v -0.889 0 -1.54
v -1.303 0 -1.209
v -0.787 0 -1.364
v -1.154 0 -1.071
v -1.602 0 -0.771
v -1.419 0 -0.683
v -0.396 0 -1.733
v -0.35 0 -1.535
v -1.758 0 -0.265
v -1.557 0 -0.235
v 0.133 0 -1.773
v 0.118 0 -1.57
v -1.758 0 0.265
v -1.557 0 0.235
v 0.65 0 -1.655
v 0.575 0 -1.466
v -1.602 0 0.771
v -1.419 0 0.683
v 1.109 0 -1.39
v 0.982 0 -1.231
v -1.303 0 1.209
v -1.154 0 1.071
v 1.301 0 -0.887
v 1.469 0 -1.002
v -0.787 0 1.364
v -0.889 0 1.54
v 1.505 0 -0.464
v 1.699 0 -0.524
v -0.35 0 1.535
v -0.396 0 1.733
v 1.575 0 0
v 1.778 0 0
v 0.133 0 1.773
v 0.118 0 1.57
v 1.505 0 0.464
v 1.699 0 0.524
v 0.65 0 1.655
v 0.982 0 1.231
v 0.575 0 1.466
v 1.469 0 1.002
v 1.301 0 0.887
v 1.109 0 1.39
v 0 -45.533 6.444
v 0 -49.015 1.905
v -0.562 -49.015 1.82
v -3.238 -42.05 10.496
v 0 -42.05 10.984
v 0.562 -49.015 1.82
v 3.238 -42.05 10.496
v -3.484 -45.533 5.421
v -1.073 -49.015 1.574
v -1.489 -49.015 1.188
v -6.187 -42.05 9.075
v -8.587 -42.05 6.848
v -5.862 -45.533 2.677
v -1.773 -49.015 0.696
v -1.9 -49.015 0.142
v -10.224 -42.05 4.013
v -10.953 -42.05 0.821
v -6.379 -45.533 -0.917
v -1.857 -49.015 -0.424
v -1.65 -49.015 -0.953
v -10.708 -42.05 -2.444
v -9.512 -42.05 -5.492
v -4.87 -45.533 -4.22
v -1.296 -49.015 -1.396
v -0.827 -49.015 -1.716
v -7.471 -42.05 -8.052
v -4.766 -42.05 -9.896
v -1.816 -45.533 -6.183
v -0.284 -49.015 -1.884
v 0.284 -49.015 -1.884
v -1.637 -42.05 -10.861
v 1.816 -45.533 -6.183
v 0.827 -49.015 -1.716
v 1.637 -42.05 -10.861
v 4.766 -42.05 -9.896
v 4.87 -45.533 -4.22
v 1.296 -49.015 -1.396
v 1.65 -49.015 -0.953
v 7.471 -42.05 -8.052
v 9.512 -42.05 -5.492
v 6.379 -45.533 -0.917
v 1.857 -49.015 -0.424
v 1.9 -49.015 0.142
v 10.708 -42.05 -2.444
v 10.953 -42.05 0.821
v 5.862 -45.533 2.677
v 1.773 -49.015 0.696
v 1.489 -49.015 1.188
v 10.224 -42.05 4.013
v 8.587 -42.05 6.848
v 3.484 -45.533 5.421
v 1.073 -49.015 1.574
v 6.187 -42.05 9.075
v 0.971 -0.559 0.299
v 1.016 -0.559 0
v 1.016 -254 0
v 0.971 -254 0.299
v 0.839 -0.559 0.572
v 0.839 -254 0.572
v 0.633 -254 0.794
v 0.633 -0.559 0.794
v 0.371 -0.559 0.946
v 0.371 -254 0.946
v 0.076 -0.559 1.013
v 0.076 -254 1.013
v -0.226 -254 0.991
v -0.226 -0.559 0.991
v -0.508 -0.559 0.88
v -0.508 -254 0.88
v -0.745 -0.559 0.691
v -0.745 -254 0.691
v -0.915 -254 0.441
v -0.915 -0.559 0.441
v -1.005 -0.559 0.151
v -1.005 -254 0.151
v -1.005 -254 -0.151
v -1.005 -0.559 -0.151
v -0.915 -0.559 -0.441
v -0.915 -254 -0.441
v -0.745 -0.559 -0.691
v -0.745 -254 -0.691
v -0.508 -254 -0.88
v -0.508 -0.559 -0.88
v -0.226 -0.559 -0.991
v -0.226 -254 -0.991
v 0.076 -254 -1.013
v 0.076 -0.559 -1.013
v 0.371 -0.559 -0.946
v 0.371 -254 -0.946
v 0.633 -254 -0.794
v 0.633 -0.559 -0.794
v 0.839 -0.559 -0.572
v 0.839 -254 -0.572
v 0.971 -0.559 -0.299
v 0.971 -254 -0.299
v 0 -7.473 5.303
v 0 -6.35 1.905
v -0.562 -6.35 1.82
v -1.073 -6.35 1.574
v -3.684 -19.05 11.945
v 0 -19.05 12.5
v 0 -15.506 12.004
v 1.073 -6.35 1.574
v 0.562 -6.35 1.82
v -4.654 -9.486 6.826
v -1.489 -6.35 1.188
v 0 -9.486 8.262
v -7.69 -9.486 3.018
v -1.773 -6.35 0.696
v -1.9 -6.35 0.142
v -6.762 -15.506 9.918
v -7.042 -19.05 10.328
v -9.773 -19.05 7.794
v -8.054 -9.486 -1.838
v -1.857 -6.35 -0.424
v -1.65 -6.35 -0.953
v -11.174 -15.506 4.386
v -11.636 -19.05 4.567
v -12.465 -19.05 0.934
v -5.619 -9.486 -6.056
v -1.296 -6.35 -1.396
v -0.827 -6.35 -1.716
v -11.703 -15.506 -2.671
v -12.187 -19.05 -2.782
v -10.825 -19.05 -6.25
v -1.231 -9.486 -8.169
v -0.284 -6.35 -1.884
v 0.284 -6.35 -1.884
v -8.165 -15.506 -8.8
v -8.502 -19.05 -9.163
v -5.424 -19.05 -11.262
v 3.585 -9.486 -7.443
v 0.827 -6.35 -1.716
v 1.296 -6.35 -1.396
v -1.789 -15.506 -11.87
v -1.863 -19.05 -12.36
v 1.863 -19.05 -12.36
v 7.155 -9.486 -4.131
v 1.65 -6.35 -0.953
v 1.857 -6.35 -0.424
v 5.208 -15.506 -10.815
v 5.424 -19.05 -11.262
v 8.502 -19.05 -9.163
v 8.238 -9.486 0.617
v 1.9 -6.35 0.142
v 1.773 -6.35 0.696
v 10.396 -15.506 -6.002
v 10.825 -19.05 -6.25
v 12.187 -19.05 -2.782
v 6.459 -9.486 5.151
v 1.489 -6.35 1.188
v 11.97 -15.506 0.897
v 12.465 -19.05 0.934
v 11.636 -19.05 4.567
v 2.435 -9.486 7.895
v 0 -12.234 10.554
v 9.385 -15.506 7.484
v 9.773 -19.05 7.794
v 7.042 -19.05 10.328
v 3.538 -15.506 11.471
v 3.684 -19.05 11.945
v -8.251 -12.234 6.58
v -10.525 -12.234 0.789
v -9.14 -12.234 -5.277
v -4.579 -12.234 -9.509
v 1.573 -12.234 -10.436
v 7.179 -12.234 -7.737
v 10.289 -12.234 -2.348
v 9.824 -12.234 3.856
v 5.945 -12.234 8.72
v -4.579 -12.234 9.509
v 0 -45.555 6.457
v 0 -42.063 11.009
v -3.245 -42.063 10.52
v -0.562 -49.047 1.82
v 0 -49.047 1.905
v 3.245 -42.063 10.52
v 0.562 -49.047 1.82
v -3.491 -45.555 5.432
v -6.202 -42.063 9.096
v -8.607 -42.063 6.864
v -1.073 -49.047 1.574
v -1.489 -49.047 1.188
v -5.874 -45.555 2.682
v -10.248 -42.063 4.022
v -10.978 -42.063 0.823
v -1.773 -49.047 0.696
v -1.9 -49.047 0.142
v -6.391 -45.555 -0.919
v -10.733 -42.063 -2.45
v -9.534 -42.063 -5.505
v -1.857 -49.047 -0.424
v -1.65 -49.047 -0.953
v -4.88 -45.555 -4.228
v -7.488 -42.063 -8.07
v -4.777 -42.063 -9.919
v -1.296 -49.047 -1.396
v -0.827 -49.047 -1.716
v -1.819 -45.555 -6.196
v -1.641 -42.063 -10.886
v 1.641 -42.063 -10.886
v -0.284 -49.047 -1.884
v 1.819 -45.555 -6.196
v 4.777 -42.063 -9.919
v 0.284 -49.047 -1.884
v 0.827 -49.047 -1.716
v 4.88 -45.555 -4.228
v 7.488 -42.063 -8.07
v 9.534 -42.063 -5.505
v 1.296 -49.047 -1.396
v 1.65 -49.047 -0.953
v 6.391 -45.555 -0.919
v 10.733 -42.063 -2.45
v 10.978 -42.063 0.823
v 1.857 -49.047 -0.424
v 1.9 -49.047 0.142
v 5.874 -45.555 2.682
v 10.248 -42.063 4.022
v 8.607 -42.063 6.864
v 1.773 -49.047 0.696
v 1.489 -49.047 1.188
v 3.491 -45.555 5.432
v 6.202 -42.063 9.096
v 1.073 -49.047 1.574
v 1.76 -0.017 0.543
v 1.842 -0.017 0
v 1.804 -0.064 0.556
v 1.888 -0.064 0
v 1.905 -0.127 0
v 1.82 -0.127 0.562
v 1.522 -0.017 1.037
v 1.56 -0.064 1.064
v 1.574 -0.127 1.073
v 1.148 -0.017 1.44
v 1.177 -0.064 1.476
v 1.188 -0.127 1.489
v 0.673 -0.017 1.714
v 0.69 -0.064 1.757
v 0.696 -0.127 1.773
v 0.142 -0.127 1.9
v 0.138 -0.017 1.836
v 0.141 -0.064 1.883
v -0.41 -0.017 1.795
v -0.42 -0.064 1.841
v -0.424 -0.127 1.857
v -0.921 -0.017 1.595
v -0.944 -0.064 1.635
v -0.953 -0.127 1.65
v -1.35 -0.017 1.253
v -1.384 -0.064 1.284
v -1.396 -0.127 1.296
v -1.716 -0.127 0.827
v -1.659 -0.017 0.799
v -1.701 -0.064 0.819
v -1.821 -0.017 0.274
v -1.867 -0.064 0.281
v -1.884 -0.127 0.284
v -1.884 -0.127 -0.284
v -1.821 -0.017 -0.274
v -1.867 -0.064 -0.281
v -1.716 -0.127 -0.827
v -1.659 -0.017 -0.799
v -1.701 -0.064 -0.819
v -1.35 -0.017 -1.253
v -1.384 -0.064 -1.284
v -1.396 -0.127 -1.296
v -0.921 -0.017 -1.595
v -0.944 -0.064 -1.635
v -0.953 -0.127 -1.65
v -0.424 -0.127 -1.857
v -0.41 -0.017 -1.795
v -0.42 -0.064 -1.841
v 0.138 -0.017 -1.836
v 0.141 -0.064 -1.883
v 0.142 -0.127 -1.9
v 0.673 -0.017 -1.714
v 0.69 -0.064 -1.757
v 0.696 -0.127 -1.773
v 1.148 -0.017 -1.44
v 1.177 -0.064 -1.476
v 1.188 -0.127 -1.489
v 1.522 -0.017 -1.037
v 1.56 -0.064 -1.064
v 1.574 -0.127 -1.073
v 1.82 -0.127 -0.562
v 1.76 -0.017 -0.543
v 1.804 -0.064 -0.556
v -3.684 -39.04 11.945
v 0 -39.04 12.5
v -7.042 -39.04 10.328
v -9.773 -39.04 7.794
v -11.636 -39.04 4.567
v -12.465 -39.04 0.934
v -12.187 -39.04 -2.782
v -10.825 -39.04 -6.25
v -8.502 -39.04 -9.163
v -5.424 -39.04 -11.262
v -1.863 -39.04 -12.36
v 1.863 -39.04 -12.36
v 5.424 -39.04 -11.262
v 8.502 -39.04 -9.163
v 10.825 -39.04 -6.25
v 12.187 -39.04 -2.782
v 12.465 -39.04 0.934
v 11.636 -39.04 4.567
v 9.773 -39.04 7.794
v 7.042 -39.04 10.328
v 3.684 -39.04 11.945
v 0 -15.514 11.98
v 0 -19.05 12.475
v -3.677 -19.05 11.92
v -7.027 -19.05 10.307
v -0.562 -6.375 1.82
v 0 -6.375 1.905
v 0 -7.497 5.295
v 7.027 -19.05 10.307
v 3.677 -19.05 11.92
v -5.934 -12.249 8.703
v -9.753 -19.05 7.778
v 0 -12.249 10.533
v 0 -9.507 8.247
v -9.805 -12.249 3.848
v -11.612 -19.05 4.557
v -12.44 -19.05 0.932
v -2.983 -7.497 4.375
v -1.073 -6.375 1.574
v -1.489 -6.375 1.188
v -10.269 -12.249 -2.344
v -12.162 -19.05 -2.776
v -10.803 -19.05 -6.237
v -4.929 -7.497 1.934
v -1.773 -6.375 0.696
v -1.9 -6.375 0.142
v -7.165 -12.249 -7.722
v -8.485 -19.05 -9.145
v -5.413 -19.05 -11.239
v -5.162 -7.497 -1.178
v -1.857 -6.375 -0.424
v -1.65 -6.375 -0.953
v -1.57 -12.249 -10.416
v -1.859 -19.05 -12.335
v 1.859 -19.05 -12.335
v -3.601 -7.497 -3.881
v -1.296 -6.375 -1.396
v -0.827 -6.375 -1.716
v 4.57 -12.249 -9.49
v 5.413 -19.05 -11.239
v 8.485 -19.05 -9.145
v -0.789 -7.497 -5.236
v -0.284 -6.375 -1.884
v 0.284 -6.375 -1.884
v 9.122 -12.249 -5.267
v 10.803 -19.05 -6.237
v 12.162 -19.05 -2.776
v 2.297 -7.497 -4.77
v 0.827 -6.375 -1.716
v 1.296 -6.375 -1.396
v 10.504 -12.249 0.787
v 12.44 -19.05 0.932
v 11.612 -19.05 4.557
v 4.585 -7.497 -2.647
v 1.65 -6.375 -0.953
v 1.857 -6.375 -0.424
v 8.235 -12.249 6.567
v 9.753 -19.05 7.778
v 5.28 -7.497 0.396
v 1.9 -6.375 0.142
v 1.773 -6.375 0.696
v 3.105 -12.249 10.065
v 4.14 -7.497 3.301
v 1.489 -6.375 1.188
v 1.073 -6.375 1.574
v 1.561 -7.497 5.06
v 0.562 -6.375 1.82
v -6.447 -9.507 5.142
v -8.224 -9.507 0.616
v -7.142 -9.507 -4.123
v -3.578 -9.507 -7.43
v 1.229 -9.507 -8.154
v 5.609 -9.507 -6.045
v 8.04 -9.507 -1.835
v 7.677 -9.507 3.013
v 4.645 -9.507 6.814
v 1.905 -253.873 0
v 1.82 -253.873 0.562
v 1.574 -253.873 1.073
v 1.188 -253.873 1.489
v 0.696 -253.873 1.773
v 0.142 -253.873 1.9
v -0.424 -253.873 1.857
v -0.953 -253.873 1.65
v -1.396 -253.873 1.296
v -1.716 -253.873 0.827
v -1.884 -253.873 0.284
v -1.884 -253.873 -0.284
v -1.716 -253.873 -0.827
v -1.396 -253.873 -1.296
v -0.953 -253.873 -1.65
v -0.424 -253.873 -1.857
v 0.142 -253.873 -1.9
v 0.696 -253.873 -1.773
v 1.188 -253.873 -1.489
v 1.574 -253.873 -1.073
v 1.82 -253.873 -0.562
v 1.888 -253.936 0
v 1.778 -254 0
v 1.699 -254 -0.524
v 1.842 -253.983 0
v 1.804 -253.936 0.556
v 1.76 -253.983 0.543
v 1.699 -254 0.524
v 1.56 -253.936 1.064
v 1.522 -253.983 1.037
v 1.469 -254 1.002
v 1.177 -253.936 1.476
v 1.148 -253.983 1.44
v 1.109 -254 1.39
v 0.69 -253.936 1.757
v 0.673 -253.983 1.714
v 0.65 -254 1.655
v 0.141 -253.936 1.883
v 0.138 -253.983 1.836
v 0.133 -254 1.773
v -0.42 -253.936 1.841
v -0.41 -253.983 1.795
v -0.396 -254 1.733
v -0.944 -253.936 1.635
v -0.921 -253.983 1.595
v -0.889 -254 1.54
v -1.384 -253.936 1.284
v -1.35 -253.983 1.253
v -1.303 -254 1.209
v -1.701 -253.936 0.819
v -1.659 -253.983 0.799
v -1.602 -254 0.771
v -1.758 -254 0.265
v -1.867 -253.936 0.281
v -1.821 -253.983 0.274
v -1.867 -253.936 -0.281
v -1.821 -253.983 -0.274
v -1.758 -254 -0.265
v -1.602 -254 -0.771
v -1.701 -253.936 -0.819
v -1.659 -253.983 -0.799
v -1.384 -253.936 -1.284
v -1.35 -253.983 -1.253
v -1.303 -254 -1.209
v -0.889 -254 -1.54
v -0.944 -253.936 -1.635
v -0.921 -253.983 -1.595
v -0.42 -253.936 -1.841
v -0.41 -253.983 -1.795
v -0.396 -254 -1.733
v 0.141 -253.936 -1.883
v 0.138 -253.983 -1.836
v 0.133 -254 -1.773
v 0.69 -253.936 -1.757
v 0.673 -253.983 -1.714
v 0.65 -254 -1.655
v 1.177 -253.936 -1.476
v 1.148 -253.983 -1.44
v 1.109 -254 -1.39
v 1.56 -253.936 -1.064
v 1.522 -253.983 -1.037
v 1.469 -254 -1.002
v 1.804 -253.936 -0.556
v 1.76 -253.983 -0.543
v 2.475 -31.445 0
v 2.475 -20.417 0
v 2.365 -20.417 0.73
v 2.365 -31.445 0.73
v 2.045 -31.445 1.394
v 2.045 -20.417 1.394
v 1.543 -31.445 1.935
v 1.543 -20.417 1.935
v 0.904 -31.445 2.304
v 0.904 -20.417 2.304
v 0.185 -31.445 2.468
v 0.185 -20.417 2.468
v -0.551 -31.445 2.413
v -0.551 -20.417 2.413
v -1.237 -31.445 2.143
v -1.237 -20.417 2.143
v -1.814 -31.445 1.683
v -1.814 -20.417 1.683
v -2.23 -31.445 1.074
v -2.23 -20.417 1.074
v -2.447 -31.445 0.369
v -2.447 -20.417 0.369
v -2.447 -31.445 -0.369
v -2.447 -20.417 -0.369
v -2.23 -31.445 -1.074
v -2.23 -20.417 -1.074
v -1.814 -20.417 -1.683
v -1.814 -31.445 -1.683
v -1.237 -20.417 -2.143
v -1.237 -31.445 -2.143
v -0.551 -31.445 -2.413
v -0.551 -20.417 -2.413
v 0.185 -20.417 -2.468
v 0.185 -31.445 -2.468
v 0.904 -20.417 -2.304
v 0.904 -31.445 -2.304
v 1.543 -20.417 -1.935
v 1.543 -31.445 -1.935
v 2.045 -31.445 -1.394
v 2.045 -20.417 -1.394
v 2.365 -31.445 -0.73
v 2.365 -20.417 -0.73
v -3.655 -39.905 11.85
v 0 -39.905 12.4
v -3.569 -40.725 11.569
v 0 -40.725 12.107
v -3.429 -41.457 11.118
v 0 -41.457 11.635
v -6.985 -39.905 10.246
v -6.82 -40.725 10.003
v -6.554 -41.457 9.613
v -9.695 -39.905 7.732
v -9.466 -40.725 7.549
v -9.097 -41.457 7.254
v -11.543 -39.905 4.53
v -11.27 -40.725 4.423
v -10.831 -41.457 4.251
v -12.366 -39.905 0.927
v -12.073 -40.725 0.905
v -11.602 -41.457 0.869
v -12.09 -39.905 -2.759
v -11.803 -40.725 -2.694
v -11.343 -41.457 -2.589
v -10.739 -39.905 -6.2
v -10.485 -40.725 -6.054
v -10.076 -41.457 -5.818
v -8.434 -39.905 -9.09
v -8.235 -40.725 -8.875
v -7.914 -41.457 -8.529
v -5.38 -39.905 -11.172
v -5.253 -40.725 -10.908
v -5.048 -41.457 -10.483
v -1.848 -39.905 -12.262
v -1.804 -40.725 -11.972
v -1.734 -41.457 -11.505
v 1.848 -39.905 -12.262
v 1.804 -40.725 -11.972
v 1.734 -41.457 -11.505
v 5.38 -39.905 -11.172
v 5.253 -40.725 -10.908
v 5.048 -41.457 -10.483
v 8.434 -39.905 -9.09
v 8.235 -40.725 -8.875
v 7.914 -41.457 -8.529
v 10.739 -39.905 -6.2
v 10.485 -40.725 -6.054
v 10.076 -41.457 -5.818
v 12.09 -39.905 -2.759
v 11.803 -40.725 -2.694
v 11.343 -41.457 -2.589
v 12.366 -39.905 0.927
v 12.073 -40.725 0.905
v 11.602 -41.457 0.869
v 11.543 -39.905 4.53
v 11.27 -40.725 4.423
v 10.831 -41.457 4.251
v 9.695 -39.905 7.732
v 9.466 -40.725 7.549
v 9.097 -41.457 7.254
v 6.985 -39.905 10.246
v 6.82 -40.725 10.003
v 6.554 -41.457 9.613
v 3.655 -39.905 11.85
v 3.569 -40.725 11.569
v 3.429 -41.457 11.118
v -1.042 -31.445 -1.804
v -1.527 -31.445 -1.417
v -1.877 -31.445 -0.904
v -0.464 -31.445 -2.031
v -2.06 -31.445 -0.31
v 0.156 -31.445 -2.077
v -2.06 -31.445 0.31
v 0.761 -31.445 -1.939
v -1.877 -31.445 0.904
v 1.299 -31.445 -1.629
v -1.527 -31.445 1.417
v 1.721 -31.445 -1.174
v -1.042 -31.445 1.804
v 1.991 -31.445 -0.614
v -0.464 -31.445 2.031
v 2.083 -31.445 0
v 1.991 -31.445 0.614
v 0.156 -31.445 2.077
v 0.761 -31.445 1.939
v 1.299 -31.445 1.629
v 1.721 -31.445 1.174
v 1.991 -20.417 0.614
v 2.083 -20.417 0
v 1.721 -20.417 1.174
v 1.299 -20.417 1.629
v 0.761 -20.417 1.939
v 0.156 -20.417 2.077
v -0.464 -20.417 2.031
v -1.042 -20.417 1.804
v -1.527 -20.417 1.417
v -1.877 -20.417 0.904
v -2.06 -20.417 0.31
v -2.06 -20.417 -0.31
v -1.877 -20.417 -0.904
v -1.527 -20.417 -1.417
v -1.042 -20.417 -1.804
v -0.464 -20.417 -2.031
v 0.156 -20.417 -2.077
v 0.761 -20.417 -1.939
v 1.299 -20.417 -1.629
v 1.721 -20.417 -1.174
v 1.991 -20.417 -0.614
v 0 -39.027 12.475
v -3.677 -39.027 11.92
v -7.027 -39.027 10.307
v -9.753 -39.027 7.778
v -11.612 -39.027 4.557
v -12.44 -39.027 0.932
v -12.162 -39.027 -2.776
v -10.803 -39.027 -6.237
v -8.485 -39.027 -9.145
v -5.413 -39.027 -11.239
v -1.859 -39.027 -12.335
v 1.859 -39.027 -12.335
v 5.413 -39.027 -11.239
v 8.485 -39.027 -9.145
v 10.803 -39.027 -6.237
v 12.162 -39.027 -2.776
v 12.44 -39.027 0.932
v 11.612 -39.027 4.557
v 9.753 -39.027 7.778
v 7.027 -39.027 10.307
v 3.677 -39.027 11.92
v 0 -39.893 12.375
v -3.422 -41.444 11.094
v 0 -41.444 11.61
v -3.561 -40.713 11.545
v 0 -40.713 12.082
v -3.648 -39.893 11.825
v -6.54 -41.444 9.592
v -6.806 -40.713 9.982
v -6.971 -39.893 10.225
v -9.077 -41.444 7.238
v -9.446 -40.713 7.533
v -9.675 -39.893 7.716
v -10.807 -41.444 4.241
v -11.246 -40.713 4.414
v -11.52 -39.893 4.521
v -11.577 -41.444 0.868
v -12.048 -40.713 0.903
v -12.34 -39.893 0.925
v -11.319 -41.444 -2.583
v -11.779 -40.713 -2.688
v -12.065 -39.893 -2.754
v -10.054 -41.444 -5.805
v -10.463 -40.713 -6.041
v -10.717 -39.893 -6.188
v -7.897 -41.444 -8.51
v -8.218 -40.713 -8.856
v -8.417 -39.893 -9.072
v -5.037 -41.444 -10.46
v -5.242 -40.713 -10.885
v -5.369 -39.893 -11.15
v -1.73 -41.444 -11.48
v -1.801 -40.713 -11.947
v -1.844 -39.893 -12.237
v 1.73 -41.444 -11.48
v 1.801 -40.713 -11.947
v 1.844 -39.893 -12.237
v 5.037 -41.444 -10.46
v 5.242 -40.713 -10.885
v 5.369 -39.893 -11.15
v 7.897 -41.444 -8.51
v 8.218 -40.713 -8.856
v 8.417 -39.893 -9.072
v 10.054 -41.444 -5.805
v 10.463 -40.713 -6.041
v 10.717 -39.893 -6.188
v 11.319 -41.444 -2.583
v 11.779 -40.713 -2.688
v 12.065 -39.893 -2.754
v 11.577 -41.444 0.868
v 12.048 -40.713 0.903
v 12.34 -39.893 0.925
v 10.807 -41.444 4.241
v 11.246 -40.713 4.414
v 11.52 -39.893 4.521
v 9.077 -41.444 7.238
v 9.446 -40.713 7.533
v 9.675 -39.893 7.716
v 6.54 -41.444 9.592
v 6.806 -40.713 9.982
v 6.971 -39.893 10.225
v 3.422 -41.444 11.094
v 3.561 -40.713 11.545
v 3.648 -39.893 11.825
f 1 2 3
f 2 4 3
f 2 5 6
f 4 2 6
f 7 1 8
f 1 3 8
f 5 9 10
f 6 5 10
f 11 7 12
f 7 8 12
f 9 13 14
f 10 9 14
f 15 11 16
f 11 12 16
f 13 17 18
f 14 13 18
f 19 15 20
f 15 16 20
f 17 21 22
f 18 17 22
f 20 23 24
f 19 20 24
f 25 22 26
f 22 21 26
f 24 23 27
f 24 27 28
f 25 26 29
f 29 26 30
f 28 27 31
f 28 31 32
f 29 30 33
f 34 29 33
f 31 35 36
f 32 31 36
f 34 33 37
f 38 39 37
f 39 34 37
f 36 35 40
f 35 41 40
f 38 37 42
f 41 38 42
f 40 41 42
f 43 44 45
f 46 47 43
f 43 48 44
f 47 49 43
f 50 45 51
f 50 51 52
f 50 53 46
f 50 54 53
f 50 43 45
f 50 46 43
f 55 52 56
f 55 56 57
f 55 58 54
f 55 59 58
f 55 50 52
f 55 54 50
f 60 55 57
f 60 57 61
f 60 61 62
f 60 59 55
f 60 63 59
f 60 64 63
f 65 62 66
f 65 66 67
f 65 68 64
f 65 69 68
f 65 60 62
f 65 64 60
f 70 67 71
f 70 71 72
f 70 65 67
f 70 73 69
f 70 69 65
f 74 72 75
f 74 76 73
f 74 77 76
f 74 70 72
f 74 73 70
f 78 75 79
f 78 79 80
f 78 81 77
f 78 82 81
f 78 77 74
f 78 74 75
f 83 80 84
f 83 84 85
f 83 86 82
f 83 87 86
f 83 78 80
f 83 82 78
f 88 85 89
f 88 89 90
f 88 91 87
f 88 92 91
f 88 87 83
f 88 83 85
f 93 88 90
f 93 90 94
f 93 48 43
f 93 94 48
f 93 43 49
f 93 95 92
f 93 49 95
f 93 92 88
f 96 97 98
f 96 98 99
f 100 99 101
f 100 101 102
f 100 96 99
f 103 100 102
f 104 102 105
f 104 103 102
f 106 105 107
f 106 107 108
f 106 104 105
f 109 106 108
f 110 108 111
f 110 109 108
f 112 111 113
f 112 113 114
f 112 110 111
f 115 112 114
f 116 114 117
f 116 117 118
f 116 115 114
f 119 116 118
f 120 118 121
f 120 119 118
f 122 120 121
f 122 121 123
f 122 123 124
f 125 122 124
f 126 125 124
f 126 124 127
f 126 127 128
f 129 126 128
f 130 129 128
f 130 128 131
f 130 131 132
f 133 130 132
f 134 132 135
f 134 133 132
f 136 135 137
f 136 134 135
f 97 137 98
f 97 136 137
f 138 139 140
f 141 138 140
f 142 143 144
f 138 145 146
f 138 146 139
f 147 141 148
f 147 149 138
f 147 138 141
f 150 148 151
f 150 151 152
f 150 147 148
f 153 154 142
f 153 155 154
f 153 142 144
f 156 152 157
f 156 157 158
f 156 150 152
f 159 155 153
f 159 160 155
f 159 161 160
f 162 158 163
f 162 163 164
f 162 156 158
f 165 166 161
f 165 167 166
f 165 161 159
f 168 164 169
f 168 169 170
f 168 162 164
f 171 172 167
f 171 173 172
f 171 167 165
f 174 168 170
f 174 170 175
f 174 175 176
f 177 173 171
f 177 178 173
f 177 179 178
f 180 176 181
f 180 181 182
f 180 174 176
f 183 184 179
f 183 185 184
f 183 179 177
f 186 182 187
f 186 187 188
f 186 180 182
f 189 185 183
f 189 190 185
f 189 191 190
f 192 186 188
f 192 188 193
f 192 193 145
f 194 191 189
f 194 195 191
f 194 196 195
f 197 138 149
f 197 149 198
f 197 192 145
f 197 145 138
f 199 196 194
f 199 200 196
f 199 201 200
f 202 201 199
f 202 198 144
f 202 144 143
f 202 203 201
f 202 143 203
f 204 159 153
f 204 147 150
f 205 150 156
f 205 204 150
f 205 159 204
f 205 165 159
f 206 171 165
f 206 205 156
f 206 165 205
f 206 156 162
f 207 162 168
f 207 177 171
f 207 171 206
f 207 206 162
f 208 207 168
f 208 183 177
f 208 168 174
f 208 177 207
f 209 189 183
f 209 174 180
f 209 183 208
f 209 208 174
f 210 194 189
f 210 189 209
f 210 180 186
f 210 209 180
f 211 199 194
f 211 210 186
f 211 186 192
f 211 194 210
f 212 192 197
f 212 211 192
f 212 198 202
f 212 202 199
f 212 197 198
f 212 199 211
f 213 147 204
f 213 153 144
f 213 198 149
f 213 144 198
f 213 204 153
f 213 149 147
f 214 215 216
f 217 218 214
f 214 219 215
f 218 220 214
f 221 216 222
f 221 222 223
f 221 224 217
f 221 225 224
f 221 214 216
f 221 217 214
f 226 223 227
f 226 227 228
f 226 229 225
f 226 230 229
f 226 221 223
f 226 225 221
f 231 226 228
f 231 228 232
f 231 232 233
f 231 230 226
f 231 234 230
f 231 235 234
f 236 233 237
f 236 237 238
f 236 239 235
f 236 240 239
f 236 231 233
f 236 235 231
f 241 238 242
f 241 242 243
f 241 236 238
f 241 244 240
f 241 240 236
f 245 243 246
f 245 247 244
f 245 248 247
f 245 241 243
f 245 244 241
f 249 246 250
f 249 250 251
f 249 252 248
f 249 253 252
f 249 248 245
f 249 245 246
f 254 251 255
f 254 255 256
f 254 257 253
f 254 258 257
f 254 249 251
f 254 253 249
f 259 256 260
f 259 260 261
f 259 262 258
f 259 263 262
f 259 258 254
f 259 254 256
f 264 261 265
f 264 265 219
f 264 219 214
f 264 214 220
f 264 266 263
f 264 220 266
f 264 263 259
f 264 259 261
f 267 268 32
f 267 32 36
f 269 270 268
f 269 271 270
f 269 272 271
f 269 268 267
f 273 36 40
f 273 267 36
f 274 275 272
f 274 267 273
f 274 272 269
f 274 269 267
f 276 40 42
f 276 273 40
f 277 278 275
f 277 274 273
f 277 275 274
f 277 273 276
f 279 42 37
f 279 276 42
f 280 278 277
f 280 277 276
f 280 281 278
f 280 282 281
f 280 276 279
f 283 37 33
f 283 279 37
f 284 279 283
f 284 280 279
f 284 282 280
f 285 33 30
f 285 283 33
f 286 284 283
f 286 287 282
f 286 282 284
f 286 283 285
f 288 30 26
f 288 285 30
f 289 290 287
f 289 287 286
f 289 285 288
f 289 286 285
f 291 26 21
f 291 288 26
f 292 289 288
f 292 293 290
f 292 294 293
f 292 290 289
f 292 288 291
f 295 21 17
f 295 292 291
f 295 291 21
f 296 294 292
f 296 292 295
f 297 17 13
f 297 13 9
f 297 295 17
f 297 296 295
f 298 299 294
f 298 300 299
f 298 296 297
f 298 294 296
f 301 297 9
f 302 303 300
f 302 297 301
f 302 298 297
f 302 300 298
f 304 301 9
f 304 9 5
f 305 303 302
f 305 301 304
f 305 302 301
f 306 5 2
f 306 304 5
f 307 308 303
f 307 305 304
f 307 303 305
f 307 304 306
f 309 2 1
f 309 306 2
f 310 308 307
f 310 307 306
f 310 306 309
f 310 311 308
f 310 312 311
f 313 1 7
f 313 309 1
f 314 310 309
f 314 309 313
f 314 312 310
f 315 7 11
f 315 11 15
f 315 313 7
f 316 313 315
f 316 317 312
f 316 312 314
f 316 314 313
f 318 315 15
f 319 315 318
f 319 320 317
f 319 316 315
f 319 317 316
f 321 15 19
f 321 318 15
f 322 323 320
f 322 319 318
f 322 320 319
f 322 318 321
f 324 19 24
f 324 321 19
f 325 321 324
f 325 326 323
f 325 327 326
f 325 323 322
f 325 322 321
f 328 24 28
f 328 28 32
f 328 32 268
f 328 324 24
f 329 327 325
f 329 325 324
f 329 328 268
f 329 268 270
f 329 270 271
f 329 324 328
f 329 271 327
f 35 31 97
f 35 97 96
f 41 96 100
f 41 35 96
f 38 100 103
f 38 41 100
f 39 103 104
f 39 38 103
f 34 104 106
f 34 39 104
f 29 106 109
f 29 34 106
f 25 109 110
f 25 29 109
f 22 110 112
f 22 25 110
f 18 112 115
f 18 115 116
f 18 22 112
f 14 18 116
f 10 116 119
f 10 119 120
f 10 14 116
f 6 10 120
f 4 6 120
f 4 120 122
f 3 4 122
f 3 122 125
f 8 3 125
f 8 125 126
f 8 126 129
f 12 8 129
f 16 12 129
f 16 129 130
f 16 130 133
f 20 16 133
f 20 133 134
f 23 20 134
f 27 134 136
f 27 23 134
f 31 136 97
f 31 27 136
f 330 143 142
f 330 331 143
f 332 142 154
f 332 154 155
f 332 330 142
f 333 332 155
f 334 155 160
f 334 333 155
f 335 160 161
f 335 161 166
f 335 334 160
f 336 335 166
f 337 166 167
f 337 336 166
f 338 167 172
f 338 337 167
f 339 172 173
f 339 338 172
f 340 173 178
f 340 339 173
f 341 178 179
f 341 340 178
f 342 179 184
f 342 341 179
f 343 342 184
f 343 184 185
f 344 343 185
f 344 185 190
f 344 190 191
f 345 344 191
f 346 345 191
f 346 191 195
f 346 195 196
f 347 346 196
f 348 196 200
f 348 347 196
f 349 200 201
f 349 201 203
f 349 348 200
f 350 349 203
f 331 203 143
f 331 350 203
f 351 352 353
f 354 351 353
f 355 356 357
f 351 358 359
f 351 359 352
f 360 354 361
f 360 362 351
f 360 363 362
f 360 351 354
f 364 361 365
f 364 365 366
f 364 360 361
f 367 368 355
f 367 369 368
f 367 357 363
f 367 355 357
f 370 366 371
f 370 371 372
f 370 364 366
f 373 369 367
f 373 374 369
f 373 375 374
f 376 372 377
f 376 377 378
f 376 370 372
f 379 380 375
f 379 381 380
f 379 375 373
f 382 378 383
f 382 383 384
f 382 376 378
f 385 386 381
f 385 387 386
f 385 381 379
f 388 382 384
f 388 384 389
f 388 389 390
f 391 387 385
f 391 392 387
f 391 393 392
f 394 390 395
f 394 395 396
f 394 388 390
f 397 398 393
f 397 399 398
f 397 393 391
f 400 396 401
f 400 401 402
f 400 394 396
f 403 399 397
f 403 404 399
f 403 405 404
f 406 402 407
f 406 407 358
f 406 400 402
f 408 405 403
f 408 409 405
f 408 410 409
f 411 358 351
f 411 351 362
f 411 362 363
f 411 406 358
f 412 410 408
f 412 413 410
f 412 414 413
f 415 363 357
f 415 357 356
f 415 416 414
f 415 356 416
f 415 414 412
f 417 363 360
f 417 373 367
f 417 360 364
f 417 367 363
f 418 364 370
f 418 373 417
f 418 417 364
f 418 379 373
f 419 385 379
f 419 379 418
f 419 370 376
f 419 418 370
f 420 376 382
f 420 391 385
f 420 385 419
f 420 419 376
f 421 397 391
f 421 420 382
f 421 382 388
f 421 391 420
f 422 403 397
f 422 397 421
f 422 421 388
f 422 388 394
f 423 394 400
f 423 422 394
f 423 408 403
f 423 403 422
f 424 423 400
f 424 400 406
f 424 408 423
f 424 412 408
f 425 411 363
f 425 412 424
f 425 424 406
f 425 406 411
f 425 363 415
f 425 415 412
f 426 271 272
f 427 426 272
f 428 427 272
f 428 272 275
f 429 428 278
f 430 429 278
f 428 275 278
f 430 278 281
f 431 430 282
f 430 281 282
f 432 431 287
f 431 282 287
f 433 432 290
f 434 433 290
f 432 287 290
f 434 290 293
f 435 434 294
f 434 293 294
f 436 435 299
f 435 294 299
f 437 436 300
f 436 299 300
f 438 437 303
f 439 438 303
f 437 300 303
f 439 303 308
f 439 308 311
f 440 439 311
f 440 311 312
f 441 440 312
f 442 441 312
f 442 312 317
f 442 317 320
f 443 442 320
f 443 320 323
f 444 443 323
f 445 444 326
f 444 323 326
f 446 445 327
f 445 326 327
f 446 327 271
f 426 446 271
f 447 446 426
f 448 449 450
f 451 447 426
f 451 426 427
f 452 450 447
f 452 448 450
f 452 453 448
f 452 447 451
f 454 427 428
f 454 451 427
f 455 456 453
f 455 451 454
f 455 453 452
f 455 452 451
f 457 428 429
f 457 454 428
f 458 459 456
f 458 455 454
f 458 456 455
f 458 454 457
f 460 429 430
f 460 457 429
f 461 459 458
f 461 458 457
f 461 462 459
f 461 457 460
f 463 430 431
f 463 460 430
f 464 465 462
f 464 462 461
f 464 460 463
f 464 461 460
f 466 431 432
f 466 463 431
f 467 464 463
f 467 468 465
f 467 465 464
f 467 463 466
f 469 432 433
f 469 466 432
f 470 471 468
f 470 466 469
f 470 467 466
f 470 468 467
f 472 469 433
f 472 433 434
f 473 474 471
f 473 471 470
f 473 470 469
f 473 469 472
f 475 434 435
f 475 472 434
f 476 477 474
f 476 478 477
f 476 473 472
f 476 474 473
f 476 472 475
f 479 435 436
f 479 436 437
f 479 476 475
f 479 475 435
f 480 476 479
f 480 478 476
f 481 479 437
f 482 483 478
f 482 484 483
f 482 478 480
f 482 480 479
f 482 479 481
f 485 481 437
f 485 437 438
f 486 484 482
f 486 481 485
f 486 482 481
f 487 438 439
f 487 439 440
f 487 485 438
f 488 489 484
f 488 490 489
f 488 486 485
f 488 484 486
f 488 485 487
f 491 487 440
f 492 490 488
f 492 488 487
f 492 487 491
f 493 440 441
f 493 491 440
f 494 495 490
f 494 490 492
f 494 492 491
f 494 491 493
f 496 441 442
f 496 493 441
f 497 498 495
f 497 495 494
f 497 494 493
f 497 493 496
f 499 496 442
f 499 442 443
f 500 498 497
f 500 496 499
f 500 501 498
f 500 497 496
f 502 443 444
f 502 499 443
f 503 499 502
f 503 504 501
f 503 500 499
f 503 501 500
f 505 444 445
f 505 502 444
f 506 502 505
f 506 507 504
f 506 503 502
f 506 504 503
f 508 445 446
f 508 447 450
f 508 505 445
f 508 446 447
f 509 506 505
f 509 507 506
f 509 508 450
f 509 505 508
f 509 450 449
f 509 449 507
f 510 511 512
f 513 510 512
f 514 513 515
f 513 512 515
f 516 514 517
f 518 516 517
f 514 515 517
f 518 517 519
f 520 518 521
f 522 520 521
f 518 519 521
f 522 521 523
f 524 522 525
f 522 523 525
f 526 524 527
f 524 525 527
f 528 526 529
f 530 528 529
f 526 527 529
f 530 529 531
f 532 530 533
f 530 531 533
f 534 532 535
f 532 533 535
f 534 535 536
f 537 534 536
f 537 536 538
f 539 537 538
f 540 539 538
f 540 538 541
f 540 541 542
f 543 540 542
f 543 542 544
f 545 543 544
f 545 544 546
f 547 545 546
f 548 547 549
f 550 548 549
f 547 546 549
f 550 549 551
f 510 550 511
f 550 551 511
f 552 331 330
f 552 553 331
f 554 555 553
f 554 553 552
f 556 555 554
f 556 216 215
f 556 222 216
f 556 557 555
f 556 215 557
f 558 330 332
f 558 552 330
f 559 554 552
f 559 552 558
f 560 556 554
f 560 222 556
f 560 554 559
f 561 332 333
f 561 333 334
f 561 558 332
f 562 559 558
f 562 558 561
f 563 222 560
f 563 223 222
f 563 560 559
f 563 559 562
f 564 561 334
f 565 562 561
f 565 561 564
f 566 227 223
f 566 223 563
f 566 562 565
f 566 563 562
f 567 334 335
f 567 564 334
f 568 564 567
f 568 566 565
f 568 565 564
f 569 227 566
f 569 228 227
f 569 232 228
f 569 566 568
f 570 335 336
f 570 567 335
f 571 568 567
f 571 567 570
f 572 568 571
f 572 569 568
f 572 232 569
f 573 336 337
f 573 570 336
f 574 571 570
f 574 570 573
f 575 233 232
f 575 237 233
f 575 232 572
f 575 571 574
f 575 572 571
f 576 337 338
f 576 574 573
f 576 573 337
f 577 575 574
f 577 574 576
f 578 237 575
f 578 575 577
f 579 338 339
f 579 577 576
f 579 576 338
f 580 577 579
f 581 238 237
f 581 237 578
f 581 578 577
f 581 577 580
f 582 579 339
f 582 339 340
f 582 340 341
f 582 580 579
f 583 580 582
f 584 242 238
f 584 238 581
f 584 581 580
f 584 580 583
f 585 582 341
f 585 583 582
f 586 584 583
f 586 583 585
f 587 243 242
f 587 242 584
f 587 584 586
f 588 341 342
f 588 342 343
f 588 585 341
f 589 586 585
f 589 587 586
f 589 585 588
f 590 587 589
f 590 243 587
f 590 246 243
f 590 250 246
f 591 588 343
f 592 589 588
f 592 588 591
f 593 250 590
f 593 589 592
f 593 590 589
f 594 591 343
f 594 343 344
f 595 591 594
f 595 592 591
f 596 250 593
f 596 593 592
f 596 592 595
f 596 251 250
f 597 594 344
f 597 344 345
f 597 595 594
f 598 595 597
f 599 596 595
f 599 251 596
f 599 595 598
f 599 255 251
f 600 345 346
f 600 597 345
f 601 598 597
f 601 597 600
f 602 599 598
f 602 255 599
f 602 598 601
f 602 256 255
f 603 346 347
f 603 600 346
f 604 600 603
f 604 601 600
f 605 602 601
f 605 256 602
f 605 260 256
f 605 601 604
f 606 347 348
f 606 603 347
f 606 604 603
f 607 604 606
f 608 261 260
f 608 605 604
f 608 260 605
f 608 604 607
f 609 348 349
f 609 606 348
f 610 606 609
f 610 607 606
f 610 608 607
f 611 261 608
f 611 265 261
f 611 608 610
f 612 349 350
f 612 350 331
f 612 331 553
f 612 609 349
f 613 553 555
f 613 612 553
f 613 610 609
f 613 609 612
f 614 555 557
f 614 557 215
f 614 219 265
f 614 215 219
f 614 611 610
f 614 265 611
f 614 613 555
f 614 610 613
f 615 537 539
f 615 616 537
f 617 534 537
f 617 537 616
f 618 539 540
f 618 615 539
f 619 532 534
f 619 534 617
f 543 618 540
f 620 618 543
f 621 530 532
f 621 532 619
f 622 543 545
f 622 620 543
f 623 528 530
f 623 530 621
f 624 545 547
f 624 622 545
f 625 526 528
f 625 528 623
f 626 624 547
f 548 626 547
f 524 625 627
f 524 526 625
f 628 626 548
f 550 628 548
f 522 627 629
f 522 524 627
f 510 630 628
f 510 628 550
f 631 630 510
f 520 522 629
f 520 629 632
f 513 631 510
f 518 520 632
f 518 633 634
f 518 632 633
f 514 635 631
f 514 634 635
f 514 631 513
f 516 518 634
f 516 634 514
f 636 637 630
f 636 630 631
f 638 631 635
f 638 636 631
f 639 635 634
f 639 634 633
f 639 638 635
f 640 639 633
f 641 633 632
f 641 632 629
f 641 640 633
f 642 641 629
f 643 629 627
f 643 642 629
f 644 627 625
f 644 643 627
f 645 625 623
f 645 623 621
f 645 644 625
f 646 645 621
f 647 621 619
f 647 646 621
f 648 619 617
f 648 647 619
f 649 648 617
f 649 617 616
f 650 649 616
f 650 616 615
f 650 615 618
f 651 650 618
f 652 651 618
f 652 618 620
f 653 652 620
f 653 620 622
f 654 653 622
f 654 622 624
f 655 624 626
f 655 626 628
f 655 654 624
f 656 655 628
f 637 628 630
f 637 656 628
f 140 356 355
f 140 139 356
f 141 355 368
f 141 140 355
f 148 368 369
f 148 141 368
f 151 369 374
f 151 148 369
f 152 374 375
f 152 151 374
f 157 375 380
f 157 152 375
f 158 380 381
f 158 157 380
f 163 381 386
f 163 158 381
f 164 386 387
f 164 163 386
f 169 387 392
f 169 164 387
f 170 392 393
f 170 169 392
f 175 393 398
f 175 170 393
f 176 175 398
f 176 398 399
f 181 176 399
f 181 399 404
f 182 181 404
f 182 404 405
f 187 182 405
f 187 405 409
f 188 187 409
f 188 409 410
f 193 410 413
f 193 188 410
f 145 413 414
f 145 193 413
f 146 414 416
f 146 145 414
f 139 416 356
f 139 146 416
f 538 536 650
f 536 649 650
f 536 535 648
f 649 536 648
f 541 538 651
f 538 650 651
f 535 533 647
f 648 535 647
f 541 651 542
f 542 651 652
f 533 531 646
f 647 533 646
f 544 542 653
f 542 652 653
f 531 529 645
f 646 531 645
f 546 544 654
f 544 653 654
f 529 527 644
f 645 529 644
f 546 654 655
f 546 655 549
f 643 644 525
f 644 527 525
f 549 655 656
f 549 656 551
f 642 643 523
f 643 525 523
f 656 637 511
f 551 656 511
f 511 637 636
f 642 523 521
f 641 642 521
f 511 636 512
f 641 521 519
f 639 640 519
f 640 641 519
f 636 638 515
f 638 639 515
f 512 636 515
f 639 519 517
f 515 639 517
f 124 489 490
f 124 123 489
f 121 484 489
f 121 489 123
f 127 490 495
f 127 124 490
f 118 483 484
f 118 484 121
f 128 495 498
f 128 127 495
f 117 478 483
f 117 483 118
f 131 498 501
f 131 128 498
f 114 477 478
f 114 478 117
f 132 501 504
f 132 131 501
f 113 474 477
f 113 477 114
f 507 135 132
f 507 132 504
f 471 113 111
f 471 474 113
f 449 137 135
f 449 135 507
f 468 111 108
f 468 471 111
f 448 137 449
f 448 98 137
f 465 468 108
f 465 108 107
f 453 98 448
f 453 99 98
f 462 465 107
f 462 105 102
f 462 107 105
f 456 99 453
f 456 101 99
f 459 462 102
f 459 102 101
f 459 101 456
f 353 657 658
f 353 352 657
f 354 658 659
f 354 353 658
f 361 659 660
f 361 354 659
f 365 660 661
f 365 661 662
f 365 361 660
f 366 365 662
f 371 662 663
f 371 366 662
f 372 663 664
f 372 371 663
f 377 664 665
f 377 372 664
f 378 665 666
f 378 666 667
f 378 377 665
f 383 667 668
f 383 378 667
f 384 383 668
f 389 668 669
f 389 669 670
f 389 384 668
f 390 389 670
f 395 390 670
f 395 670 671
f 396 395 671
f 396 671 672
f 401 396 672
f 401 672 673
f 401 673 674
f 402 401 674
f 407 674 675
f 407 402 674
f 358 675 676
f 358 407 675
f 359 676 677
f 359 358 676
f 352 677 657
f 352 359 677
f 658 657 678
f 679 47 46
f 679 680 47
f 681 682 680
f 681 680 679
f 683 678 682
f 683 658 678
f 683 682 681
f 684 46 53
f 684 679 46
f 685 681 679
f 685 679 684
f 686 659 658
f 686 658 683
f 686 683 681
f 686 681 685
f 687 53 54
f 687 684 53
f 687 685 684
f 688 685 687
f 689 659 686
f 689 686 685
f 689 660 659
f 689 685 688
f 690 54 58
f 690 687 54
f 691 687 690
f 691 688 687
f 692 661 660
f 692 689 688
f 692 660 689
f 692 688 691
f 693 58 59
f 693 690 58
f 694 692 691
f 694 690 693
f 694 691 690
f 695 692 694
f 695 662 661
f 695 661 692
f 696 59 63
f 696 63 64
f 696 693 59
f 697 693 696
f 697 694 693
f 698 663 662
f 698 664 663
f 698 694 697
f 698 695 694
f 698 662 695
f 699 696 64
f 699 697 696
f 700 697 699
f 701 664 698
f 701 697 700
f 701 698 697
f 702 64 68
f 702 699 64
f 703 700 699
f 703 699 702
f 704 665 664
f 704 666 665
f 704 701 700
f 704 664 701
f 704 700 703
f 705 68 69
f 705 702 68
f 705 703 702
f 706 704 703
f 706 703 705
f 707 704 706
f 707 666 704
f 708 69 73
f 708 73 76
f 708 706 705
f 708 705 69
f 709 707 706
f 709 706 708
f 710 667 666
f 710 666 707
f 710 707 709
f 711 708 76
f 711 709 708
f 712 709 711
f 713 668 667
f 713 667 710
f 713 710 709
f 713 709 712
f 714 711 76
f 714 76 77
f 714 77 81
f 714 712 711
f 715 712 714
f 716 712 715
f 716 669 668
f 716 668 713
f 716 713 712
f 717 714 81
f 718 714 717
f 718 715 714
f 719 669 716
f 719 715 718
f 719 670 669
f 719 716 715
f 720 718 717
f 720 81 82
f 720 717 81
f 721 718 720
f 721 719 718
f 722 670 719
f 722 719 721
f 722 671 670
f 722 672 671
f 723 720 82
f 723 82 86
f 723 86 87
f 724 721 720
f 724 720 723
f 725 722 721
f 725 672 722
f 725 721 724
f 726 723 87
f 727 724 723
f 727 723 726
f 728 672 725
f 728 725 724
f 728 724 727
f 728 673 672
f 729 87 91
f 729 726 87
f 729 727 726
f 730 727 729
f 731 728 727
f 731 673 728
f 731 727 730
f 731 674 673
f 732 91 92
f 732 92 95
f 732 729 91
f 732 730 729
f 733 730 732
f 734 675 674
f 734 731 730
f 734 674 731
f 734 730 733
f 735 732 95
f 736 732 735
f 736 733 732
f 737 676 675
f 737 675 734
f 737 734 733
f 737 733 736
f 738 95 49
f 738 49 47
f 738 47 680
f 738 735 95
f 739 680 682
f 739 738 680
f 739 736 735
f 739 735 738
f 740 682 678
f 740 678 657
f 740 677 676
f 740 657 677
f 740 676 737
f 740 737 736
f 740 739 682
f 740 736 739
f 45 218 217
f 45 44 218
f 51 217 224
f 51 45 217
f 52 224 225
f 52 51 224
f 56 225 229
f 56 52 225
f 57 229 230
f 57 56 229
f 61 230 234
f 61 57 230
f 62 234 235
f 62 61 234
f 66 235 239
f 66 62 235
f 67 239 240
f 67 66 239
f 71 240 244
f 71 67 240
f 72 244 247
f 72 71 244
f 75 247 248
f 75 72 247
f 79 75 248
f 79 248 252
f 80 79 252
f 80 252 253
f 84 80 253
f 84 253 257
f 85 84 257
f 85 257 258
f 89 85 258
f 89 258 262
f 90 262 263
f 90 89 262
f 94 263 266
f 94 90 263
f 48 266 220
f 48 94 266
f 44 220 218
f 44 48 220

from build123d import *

# Parameters (mm, degrees)
F0_R      = 1.905
F0_R_2    = 1.016
F1_DEPTH  = 254
F2_SIZE   = 0.5588
F3_R      = 0.127
F4_R      = 0.127
F12_R     = 2.474941
F12_R_2   = 2.083201
F13_DEPTH = 11.02868


with BuildPart() as f1:
    # F0 (on Front) → F1 (new body)
    with BuildSketch(Plane.XZ):
        Circle(F0_R)
        Circle(F0_R_2, mode=Mode.SUBTRACT)
    extrude(amount=F1_DEPTH)

    # F2
    f2_edges = [f1.edges().sort_by_distance(p)[0] for p in [
        (-1.016, 0, 0),
    ]]
    chamfer(f2_edges, length=F2_SIZE)

    # F3
    f3_edges = [f1.edges().sort_by_distance(p)[0] for p in [
        (-1.905, 0, 0),
    ]]
    fillet(f3_edges, radius=F3_R)

    # F4
    f4_edges = [f1.edges().sort_by_distance(p)[0] for p in [
        (-1.905, -254, 0),
    ]]
    fillet(f4_edges, radius=F4_R)


with BuildPart() as f7:
    # F6 (on Right) → F7 (revolve)
    with BuildSketch(Plane.YZ):
        with BuildLine():
            Line((-42.062655, 11.009148), (-49.0474, 1.905))
            Line((-49.0474, 1.905), (-49.015386, 1.905))
            Line((-49.015386, 1.905), (-42.050128, 10.983748))
            ThreePointArc((-42.050128, 10.983748), (-40.712524, 12.08162), (-39.027273, 12.4746))
            Line((-39.027273, 12.4746), (-19.05, 12.4746))
            ThreePointArc((-19.05, 12.4746), (-10.798304, 9.485459), (-6.3754, 1.905))
            Line((-6.3754, 1.905), (-6.35, 1.905))
            ThreePointArc((-6.35, 1.905), (-10.780417, 9.503463), (-19.05, 12.5))
            Line((-19.05, 12.5), (-39.0398, 12.5))
            ThreePointArc((-39.0398, 12.5), (-40.725051, 12.10702), (-42.062655, 11.009148))
        make_face()
    revolve(axis=Axis((0, -159.145489, 0), (0, -1, 0)))


with BuildPart() as f13:
    # F12 (on offset) → F13 (new body, through all)
    with BuildSketch(Plane.XZ.offset(20.41652)):
        Circle(F12_R)
        Circle(F12_R_2, mode=Mode.SUBTRACT)
    extrude(amount=F13_DEPTH)


solid = Compound([f1.part, f7.part, f13.part])
